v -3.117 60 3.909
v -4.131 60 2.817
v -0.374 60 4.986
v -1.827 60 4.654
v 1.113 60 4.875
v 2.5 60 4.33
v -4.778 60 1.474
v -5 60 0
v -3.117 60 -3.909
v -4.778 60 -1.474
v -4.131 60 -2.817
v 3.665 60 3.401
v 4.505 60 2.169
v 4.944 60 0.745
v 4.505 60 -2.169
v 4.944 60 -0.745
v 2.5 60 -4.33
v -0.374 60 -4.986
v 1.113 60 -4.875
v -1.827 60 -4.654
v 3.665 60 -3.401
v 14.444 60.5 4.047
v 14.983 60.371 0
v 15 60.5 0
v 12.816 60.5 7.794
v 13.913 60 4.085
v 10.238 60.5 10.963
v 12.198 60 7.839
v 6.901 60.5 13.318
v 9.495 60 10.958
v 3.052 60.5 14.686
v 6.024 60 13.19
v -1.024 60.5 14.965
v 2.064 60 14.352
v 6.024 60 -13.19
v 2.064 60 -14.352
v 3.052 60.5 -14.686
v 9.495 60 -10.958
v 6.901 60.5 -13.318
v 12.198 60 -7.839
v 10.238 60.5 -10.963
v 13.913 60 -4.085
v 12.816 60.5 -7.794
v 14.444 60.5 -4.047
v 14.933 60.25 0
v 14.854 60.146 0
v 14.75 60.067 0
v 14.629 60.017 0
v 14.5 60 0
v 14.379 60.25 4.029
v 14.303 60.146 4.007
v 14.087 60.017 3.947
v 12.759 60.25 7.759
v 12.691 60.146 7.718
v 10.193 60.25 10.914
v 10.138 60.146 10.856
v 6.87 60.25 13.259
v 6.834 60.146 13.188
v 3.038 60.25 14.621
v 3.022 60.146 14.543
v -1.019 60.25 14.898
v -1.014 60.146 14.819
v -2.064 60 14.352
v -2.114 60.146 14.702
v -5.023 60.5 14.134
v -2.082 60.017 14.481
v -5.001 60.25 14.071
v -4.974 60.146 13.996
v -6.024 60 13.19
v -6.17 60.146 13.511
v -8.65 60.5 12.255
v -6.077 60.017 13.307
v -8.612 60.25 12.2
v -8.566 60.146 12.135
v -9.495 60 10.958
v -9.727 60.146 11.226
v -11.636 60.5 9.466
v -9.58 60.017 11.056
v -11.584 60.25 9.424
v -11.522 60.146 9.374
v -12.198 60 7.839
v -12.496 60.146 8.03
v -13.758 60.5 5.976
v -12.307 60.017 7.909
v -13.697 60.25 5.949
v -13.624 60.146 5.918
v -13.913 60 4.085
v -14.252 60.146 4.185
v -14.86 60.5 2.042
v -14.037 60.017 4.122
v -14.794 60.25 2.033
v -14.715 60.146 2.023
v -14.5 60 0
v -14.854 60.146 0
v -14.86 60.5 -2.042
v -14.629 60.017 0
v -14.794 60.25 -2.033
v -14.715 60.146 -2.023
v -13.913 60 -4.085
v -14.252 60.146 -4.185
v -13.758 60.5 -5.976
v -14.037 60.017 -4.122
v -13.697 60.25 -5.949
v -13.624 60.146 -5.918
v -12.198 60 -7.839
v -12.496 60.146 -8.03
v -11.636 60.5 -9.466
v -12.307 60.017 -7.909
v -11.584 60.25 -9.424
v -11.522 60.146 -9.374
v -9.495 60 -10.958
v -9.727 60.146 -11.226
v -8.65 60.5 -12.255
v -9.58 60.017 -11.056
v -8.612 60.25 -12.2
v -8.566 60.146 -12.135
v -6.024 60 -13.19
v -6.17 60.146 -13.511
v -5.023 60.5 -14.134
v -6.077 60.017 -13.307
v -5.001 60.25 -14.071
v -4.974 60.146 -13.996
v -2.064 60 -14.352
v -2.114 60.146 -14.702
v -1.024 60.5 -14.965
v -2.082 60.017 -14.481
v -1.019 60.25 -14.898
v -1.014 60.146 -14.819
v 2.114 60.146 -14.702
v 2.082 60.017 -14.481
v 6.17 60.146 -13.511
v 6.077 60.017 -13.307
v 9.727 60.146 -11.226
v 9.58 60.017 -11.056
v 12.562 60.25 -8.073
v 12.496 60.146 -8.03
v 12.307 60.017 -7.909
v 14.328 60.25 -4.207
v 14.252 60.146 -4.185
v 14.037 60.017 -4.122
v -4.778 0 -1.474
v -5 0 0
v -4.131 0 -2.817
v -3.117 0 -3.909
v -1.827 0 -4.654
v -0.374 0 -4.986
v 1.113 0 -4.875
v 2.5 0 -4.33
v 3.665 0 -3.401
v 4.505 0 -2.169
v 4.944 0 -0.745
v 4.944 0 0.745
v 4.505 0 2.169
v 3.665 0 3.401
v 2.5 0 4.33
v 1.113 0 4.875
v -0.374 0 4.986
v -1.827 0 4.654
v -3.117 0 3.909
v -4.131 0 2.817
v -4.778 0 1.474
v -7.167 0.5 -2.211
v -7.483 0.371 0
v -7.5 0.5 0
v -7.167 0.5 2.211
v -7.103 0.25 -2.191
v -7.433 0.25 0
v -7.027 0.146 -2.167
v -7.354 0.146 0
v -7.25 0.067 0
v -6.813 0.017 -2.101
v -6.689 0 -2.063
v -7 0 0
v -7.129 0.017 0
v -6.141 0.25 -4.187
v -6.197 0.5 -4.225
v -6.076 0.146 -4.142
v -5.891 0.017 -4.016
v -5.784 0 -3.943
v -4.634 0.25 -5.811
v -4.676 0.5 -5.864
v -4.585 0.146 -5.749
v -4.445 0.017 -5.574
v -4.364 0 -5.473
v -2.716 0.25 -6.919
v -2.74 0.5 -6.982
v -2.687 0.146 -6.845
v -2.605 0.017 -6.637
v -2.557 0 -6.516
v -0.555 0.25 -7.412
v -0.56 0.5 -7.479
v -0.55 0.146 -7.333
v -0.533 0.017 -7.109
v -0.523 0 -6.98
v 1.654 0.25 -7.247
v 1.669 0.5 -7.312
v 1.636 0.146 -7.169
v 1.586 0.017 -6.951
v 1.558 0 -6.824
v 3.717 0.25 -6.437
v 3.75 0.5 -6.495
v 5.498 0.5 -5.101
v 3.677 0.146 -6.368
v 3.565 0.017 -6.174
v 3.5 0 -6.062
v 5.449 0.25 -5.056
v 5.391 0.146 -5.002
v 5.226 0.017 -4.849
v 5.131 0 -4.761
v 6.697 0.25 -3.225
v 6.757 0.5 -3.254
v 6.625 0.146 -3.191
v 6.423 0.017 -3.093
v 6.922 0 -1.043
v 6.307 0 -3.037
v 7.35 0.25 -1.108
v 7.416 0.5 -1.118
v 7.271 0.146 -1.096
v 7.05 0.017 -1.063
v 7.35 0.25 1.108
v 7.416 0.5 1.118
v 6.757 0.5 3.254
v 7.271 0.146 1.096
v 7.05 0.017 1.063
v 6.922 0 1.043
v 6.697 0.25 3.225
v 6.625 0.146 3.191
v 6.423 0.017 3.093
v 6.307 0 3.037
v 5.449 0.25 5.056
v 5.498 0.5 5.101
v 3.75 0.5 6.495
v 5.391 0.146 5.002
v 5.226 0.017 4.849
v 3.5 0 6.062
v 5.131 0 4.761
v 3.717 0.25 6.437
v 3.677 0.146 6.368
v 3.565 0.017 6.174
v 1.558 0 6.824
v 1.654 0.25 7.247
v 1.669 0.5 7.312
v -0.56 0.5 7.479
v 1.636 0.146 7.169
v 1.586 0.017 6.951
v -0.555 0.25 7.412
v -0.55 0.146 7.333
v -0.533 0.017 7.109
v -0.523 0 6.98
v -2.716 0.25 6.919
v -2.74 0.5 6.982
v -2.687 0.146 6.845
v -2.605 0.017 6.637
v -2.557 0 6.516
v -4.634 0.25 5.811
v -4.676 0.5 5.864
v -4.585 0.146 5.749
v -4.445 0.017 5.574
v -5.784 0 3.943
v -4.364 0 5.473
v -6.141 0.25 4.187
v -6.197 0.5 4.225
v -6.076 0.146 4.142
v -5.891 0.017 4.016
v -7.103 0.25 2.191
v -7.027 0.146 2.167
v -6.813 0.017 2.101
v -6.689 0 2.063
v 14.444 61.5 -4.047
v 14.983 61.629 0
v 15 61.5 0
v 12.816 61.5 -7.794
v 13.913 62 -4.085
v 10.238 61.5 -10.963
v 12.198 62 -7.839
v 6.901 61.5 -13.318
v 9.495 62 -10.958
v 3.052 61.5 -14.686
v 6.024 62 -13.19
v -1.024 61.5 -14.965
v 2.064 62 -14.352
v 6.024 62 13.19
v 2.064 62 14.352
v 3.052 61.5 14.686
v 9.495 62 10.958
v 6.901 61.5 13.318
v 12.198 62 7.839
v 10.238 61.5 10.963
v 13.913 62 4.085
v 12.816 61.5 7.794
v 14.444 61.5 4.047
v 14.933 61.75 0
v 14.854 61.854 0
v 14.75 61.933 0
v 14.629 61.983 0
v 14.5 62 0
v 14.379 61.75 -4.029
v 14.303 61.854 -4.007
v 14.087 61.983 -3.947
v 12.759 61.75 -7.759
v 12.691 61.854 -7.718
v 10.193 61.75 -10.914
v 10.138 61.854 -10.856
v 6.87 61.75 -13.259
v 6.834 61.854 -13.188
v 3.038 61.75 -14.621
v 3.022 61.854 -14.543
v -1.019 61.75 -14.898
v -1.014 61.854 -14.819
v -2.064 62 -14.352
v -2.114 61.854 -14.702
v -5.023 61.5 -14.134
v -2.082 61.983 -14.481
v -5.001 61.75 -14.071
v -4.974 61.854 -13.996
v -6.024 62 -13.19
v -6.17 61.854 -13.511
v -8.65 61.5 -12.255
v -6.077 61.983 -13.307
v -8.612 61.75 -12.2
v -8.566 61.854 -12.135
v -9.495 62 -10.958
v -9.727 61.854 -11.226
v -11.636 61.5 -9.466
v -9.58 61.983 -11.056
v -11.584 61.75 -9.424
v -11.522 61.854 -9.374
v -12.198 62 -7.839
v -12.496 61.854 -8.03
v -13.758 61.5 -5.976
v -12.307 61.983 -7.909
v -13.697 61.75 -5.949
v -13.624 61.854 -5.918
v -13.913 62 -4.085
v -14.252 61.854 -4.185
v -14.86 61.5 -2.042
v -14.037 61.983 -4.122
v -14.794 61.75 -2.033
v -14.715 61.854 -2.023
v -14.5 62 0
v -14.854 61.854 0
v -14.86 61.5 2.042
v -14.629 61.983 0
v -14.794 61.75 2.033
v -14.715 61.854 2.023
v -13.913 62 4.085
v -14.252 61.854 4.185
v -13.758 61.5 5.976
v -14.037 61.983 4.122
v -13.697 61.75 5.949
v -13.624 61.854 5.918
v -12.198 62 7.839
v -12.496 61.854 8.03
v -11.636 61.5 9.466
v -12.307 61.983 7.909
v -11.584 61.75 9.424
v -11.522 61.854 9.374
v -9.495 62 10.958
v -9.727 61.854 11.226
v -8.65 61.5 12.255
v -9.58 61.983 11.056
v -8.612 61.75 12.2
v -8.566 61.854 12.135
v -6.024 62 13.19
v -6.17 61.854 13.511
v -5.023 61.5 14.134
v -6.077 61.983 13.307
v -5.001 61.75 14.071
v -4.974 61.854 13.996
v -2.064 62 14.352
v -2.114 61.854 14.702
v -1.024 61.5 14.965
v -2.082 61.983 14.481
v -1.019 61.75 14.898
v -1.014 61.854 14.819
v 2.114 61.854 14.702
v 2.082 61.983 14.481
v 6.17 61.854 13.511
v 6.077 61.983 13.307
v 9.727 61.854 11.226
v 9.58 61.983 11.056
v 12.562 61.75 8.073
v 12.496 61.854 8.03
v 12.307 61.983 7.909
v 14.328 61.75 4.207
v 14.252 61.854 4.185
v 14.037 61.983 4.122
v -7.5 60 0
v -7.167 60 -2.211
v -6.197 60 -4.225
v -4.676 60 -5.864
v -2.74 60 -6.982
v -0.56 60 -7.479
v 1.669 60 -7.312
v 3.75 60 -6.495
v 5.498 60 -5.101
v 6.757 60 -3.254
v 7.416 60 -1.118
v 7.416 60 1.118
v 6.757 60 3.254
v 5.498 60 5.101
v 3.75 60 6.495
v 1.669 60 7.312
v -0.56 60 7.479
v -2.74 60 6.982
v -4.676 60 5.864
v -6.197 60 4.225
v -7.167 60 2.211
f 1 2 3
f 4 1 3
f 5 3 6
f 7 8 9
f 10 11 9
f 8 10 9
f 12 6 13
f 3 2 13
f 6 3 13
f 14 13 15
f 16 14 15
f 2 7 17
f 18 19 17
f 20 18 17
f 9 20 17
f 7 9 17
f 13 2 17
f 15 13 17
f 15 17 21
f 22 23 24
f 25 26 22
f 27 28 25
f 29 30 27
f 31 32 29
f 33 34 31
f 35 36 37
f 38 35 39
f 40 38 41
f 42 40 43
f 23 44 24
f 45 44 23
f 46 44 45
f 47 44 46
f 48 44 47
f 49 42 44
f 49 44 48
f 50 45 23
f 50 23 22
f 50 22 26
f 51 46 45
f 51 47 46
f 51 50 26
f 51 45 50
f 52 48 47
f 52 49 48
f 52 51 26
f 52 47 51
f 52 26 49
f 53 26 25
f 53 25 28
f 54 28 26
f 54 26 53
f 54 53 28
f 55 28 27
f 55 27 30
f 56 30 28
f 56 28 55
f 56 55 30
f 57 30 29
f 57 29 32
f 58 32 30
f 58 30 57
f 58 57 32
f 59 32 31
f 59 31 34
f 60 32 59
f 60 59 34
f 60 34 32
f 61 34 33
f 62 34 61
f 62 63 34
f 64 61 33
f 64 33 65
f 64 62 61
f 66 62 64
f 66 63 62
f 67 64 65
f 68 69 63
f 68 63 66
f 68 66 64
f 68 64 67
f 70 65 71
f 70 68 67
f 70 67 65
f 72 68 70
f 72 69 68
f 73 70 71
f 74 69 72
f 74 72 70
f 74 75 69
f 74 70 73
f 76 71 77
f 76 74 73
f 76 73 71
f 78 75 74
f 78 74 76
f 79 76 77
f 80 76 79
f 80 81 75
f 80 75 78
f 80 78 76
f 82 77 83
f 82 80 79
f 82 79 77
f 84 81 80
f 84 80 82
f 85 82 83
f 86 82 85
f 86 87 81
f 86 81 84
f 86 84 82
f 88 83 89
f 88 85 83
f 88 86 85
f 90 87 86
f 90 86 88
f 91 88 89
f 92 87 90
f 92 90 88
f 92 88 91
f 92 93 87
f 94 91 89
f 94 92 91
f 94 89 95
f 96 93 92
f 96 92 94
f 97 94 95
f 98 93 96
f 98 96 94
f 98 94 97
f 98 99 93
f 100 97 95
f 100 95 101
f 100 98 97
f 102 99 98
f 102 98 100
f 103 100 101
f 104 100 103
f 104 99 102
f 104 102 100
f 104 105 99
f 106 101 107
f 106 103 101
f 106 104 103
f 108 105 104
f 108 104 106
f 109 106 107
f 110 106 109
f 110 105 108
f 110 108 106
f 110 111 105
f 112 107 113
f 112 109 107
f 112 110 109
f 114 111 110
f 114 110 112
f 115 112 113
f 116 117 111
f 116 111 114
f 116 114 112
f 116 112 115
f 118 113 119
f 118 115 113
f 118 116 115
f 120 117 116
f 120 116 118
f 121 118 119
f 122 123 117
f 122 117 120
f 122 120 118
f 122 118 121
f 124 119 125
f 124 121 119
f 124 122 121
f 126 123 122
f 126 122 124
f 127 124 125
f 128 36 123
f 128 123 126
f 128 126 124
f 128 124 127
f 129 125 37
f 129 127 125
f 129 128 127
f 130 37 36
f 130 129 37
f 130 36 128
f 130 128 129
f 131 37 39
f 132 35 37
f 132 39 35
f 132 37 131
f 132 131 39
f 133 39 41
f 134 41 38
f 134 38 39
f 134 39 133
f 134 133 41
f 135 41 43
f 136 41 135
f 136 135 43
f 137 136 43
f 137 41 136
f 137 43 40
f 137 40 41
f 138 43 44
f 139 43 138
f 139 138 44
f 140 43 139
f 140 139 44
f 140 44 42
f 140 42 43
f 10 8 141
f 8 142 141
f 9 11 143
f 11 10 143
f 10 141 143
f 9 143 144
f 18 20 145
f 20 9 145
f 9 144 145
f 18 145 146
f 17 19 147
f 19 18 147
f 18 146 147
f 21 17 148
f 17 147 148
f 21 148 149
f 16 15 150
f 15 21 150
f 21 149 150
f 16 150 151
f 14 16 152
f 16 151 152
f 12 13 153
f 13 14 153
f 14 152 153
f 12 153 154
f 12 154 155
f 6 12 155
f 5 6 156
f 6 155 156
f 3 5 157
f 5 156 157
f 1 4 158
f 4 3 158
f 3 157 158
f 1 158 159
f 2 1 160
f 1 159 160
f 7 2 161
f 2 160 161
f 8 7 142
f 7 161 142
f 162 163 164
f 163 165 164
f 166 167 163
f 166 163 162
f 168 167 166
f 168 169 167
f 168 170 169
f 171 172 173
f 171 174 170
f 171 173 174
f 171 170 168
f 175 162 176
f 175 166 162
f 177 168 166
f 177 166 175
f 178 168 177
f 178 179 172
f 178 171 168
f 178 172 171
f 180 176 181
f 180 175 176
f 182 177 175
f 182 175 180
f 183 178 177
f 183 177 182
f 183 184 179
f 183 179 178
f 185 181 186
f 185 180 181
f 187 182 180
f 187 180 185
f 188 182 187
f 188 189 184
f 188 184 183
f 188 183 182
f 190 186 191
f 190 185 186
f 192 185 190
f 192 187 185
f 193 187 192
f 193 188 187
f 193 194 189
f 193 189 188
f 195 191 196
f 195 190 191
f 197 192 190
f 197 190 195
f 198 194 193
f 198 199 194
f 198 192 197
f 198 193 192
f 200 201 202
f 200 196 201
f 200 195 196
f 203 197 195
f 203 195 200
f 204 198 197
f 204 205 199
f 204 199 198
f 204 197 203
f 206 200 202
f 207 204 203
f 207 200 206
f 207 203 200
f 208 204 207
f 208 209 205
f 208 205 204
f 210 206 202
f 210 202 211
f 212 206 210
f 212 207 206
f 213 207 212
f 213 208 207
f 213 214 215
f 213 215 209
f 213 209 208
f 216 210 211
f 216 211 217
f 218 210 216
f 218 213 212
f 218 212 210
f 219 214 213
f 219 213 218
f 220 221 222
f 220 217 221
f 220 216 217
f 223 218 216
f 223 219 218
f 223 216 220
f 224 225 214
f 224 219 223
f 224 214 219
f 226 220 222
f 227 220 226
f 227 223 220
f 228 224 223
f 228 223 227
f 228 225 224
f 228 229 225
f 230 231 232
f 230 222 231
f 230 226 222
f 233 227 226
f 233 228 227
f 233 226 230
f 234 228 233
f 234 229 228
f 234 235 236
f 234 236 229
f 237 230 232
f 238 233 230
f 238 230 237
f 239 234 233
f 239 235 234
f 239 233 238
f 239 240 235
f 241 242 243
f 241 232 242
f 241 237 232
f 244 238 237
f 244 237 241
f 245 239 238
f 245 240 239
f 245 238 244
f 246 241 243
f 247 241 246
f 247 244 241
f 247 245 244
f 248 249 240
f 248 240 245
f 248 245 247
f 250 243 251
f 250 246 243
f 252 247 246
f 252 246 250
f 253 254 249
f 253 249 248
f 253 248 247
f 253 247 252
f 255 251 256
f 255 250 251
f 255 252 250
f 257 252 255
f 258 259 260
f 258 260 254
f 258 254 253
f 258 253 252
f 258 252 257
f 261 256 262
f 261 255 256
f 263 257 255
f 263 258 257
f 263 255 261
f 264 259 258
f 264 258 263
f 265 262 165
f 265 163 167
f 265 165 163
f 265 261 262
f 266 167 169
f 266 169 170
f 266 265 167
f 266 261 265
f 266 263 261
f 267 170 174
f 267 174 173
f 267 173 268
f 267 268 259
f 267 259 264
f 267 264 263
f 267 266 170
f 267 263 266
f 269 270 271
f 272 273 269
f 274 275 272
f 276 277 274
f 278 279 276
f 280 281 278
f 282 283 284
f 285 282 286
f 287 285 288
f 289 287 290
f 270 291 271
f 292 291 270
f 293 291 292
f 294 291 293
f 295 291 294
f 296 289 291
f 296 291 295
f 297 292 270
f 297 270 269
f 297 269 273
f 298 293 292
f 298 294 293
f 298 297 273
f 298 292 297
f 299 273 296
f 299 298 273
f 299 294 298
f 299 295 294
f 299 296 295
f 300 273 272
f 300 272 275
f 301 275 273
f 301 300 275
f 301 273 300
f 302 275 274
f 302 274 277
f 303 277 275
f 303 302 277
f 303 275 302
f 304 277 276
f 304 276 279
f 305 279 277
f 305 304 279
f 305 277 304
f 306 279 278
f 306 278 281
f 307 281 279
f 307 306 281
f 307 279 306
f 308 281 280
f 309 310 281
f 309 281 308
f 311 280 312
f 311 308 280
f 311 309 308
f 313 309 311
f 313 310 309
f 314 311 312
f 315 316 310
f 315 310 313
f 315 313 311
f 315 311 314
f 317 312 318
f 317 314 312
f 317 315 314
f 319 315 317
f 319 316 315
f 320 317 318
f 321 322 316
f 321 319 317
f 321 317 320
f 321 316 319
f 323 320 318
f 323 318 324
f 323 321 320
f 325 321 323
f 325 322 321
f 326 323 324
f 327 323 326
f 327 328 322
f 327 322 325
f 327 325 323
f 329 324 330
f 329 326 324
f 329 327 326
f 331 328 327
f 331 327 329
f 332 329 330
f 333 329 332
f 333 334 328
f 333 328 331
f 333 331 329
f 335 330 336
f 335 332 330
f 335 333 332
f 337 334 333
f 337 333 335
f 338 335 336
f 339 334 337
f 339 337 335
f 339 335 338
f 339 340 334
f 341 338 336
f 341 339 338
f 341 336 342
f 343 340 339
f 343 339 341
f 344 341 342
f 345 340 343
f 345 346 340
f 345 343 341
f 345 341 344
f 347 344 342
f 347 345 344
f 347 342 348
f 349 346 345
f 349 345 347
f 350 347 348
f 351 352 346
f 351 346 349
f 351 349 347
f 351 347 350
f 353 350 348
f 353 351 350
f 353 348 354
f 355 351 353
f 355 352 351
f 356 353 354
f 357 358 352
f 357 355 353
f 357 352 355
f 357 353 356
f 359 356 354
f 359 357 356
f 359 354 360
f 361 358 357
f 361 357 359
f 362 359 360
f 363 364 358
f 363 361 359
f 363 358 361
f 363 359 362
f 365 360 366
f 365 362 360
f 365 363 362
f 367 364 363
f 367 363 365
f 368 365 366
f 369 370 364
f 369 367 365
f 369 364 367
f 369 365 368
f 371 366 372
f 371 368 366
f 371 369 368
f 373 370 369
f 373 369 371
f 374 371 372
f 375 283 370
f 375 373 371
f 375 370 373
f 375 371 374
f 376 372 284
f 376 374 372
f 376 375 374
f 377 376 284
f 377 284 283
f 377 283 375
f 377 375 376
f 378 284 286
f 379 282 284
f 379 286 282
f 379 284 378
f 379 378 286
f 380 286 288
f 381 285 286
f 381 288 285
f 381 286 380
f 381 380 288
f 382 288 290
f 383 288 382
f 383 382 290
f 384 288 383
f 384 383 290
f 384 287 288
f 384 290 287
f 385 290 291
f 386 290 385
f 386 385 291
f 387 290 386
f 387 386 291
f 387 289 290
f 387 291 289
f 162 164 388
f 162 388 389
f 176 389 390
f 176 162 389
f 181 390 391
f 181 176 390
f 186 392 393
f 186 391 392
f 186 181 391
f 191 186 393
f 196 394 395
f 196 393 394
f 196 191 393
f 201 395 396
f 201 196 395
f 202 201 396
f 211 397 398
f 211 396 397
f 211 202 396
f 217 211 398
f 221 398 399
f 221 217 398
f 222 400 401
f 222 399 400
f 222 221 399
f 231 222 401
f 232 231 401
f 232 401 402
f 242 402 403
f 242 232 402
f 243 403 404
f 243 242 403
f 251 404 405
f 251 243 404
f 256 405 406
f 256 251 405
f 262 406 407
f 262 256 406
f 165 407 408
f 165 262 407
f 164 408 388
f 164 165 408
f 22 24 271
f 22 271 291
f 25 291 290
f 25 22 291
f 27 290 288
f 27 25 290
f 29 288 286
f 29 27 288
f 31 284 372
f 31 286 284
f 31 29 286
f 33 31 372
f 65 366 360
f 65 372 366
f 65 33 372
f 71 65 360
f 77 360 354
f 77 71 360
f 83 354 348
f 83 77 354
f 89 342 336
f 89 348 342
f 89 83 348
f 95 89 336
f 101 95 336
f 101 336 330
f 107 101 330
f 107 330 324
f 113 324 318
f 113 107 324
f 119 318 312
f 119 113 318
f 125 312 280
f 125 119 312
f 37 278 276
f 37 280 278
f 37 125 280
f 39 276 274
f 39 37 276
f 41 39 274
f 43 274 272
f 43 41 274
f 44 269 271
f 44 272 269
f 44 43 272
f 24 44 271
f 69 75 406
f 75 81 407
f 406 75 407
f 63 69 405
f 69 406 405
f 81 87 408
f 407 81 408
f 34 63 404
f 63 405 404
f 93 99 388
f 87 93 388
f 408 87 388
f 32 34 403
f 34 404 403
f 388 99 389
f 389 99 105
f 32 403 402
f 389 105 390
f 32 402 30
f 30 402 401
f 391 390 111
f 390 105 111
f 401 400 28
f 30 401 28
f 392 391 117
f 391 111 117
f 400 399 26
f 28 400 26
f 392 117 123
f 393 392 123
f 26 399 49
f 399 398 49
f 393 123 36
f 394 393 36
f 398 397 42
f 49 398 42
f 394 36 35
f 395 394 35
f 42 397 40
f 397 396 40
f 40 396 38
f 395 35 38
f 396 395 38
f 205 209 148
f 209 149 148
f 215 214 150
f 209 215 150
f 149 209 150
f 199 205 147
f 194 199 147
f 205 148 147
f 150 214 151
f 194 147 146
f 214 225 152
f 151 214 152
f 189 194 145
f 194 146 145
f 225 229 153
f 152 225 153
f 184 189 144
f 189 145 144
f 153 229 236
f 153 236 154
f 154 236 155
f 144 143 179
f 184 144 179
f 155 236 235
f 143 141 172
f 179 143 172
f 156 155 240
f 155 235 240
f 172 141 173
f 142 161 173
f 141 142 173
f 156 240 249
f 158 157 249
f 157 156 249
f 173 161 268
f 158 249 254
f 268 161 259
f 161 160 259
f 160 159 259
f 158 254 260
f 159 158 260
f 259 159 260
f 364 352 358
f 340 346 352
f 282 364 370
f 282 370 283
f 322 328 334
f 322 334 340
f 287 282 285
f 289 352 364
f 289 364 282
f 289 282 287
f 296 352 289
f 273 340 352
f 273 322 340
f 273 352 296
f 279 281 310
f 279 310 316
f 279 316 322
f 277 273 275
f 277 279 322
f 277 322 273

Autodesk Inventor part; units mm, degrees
ref_plane "YZ Plane" through (0, 0, 0) normal (1, 0, 0) x (0, 1, 0)
ref_plane "XZ Plane" through (0, 0, 0) normal (0, 1, 0) x (-1, 0, 0)
ref_plane "XY Plane" through (0, 0, 0) normal (0, 0, 1) x (1, 0, 0)
sketch "Boceto1" plane through (0, 0, 0) normal (0, 1, 0) x (-1, 0, 0)
  circle A0 centre (0, 0) radius 7.5
  circle A1 centre (0, 0) radius 5
  dimension "d0" = 15
  dimension "d1" = 10
extrude "Extrusión1" add sketch "Boceto1" along normal blind 60
sketch "Boceto2" plane through (0, 60, 0) normal (0, 1, 0) x (1, 0, 0)
  circle A0 centre (0, 0) radius 15
  dimension "d4" = 30
extrude "Extrusión2" add sketch "Boceto2" along normal blind 2
fillet "Empalme1" radius 0.5 1 edges at (-15, 62, 0)
fillet "Empalme2" radius 0.5 1 edges at (-15, 60, 0)
fillet "Empalme3" radius 0.5 1 edges at (7.5, 0, 0)
properties part number "contra_bici"
